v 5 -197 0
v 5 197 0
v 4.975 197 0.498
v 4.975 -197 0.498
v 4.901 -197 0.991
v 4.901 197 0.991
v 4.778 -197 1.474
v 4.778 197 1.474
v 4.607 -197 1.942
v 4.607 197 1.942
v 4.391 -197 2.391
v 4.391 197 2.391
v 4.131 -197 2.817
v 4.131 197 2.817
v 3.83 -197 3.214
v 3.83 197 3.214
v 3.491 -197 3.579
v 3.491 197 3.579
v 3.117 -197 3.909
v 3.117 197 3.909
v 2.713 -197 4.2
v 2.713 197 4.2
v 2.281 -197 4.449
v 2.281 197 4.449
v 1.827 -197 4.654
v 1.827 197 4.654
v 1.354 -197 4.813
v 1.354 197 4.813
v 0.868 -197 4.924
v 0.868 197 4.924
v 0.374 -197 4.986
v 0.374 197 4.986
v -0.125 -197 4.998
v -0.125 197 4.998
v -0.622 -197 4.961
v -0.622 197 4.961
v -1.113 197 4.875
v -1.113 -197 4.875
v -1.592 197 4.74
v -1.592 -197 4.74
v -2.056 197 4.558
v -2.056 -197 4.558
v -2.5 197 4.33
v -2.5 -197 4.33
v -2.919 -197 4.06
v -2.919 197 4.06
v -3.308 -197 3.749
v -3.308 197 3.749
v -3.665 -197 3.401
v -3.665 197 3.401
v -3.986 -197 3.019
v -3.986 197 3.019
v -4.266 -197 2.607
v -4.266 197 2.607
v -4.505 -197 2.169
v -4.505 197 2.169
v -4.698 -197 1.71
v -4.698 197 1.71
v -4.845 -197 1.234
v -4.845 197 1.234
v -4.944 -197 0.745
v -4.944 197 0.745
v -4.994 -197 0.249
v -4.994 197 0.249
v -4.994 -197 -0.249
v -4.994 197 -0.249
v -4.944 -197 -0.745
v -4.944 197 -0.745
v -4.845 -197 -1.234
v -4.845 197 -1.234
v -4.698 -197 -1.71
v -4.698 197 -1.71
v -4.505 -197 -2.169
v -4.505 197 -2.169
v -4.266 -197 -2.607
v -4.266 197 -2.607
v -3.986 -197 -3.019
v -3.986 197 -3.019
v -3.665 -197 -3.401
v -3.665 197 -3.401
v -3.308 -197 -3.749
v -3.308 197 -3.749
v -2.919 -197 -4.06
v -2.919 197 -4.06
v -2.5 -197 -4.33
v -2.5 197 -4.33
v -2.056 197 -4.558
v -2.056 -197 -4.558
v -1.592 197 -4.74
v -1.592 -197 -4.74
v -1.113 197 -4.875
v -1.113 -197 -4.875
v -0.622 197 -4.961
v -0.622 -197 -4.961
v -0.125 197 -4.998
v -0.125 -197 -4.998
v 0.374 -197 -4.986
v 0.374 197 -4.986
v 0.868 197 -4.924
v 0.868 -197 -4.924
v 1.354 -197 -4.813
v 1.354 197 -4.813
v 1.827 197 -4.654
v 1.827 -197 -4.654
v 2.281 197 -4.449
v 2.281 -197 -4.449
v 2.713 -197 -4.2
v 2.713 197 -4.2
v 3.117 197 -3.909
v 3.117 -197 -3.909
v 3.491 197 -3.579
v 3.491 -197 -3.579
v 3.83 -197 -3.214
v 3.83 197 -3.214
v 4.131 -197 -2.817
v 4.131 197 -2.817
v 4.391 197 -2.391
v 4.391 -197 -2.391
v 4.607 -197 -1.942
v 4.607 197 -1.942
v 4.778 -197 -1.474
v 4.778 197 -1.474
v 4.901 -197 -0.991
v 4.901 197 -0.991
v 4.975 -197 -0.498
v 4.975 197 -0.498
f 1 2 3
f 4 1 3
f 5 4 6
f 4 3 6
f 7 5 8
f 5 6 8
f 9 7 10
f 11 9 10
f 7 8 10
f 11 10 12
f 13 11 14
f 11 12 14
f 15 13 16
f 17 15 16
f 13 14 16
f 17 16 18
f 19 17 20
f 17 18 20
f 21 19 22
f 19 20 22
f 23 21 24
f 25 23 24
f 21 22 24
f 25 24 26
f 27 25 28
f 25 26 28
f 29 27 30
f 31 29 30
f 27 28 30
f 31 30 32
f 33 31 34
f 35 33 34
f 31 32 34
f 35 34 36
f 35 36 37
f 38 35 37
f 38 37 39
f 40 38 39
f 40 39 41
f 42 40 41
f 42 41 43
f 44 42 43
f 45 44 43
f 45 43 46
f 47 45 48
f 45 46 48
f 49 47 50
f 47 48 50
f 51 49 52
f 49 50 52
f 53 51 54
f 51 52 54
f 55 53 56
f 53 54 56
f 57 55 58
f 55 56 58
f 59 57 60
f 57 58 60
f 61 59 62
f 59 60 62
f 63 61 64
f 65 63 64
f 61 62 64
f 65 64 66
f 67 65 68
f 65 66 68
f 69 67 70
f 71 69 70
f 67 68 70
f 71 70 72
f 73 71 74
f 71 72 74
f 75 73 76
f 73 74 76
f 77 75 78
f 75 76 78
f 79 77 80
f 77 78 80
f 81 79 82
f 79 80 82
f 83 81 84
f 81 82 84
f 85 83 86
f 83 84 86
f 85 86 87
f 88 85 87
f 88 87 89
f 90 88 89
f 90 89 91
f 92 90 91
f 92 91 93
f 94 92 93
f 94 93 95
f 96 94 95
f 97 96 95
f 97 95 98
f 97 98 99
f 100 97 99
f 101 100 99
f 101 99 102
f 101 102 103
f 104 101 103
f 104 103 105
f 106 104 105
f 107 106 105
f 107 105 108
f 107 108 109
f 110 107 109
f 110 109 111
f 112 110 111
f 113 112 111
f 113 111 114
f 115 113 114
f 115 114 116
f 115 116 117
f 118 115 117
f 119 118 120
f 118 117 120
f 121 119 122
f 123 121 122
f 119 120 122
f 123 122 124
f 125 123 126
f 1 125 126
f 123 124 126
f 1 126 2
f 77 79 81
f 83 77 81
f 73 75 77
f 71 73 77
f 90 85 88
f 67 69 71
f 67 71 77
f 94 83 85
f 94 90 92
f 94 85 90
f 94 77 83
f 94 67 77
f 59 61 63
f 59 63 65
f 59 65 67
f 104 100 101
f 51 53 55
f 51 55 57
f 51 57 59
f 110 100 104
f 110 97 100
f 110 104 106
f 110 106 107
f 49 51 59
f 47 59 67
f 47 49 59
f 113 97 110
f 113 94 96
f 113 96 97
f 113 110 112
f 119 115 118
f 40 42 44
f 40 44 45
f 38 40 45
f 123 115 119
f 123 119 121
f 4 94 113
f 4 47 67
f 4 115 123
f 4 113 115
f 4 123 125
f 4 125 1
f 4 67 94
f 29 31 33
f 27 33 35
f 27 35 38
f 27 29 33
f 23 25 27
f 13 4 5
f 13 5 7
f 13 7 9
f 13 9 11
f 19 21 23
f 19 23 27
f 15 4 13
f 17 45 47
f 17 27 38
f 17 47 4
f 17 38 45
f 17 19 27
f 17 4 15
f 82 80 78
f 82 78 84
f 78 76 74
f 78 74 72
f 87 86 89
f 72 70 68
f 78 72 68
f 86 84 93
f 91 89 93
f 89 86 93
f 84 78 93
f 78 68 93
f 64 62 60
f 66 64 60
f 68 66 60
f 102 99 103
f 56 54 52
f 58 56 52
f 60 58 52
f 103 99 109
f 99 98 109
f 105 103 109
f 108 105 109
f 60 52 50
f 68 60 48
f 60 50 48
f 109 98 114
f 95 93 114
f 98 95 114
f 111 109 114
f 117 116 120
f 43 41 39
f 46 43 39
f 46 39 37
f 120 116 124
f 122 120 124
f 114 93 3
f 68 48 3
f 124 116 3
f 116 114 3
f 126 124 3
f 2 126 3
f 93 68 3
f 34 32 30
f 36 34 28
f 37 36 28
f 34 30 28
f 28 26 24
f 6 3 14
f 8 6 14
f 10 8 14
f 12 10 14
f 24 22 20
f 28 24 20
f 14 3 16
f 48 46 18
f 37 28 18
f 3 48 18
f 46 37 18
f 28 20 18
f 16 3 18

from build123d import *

# Parameters (mm, degrees)
CYLINDER_R          = 5
CYLINDER_DEPTH      = 394
CYLINDER_ROLL_ANGLE = 90


with BuildPart() as part:
    # Cylinder → Cylinder (new body)
    with BuildSketch(Plane.XY):
        Circle(CYLINDER_R)
    extrude(amount=CYLINDER_DEPTH)


with BuildPart() as part_1:
    # Cylinder roll: moved
    add(part.part.rotate(Axis((0, 0, 0), (1, 0, 0)), CYLINDER_ROLL_ANGLE))


with BuildPart() as part_2:
    # Cylinder placement: moved
    add(part_1.part.moved(Location((0, 197, 0))))


solid = part_2.part
